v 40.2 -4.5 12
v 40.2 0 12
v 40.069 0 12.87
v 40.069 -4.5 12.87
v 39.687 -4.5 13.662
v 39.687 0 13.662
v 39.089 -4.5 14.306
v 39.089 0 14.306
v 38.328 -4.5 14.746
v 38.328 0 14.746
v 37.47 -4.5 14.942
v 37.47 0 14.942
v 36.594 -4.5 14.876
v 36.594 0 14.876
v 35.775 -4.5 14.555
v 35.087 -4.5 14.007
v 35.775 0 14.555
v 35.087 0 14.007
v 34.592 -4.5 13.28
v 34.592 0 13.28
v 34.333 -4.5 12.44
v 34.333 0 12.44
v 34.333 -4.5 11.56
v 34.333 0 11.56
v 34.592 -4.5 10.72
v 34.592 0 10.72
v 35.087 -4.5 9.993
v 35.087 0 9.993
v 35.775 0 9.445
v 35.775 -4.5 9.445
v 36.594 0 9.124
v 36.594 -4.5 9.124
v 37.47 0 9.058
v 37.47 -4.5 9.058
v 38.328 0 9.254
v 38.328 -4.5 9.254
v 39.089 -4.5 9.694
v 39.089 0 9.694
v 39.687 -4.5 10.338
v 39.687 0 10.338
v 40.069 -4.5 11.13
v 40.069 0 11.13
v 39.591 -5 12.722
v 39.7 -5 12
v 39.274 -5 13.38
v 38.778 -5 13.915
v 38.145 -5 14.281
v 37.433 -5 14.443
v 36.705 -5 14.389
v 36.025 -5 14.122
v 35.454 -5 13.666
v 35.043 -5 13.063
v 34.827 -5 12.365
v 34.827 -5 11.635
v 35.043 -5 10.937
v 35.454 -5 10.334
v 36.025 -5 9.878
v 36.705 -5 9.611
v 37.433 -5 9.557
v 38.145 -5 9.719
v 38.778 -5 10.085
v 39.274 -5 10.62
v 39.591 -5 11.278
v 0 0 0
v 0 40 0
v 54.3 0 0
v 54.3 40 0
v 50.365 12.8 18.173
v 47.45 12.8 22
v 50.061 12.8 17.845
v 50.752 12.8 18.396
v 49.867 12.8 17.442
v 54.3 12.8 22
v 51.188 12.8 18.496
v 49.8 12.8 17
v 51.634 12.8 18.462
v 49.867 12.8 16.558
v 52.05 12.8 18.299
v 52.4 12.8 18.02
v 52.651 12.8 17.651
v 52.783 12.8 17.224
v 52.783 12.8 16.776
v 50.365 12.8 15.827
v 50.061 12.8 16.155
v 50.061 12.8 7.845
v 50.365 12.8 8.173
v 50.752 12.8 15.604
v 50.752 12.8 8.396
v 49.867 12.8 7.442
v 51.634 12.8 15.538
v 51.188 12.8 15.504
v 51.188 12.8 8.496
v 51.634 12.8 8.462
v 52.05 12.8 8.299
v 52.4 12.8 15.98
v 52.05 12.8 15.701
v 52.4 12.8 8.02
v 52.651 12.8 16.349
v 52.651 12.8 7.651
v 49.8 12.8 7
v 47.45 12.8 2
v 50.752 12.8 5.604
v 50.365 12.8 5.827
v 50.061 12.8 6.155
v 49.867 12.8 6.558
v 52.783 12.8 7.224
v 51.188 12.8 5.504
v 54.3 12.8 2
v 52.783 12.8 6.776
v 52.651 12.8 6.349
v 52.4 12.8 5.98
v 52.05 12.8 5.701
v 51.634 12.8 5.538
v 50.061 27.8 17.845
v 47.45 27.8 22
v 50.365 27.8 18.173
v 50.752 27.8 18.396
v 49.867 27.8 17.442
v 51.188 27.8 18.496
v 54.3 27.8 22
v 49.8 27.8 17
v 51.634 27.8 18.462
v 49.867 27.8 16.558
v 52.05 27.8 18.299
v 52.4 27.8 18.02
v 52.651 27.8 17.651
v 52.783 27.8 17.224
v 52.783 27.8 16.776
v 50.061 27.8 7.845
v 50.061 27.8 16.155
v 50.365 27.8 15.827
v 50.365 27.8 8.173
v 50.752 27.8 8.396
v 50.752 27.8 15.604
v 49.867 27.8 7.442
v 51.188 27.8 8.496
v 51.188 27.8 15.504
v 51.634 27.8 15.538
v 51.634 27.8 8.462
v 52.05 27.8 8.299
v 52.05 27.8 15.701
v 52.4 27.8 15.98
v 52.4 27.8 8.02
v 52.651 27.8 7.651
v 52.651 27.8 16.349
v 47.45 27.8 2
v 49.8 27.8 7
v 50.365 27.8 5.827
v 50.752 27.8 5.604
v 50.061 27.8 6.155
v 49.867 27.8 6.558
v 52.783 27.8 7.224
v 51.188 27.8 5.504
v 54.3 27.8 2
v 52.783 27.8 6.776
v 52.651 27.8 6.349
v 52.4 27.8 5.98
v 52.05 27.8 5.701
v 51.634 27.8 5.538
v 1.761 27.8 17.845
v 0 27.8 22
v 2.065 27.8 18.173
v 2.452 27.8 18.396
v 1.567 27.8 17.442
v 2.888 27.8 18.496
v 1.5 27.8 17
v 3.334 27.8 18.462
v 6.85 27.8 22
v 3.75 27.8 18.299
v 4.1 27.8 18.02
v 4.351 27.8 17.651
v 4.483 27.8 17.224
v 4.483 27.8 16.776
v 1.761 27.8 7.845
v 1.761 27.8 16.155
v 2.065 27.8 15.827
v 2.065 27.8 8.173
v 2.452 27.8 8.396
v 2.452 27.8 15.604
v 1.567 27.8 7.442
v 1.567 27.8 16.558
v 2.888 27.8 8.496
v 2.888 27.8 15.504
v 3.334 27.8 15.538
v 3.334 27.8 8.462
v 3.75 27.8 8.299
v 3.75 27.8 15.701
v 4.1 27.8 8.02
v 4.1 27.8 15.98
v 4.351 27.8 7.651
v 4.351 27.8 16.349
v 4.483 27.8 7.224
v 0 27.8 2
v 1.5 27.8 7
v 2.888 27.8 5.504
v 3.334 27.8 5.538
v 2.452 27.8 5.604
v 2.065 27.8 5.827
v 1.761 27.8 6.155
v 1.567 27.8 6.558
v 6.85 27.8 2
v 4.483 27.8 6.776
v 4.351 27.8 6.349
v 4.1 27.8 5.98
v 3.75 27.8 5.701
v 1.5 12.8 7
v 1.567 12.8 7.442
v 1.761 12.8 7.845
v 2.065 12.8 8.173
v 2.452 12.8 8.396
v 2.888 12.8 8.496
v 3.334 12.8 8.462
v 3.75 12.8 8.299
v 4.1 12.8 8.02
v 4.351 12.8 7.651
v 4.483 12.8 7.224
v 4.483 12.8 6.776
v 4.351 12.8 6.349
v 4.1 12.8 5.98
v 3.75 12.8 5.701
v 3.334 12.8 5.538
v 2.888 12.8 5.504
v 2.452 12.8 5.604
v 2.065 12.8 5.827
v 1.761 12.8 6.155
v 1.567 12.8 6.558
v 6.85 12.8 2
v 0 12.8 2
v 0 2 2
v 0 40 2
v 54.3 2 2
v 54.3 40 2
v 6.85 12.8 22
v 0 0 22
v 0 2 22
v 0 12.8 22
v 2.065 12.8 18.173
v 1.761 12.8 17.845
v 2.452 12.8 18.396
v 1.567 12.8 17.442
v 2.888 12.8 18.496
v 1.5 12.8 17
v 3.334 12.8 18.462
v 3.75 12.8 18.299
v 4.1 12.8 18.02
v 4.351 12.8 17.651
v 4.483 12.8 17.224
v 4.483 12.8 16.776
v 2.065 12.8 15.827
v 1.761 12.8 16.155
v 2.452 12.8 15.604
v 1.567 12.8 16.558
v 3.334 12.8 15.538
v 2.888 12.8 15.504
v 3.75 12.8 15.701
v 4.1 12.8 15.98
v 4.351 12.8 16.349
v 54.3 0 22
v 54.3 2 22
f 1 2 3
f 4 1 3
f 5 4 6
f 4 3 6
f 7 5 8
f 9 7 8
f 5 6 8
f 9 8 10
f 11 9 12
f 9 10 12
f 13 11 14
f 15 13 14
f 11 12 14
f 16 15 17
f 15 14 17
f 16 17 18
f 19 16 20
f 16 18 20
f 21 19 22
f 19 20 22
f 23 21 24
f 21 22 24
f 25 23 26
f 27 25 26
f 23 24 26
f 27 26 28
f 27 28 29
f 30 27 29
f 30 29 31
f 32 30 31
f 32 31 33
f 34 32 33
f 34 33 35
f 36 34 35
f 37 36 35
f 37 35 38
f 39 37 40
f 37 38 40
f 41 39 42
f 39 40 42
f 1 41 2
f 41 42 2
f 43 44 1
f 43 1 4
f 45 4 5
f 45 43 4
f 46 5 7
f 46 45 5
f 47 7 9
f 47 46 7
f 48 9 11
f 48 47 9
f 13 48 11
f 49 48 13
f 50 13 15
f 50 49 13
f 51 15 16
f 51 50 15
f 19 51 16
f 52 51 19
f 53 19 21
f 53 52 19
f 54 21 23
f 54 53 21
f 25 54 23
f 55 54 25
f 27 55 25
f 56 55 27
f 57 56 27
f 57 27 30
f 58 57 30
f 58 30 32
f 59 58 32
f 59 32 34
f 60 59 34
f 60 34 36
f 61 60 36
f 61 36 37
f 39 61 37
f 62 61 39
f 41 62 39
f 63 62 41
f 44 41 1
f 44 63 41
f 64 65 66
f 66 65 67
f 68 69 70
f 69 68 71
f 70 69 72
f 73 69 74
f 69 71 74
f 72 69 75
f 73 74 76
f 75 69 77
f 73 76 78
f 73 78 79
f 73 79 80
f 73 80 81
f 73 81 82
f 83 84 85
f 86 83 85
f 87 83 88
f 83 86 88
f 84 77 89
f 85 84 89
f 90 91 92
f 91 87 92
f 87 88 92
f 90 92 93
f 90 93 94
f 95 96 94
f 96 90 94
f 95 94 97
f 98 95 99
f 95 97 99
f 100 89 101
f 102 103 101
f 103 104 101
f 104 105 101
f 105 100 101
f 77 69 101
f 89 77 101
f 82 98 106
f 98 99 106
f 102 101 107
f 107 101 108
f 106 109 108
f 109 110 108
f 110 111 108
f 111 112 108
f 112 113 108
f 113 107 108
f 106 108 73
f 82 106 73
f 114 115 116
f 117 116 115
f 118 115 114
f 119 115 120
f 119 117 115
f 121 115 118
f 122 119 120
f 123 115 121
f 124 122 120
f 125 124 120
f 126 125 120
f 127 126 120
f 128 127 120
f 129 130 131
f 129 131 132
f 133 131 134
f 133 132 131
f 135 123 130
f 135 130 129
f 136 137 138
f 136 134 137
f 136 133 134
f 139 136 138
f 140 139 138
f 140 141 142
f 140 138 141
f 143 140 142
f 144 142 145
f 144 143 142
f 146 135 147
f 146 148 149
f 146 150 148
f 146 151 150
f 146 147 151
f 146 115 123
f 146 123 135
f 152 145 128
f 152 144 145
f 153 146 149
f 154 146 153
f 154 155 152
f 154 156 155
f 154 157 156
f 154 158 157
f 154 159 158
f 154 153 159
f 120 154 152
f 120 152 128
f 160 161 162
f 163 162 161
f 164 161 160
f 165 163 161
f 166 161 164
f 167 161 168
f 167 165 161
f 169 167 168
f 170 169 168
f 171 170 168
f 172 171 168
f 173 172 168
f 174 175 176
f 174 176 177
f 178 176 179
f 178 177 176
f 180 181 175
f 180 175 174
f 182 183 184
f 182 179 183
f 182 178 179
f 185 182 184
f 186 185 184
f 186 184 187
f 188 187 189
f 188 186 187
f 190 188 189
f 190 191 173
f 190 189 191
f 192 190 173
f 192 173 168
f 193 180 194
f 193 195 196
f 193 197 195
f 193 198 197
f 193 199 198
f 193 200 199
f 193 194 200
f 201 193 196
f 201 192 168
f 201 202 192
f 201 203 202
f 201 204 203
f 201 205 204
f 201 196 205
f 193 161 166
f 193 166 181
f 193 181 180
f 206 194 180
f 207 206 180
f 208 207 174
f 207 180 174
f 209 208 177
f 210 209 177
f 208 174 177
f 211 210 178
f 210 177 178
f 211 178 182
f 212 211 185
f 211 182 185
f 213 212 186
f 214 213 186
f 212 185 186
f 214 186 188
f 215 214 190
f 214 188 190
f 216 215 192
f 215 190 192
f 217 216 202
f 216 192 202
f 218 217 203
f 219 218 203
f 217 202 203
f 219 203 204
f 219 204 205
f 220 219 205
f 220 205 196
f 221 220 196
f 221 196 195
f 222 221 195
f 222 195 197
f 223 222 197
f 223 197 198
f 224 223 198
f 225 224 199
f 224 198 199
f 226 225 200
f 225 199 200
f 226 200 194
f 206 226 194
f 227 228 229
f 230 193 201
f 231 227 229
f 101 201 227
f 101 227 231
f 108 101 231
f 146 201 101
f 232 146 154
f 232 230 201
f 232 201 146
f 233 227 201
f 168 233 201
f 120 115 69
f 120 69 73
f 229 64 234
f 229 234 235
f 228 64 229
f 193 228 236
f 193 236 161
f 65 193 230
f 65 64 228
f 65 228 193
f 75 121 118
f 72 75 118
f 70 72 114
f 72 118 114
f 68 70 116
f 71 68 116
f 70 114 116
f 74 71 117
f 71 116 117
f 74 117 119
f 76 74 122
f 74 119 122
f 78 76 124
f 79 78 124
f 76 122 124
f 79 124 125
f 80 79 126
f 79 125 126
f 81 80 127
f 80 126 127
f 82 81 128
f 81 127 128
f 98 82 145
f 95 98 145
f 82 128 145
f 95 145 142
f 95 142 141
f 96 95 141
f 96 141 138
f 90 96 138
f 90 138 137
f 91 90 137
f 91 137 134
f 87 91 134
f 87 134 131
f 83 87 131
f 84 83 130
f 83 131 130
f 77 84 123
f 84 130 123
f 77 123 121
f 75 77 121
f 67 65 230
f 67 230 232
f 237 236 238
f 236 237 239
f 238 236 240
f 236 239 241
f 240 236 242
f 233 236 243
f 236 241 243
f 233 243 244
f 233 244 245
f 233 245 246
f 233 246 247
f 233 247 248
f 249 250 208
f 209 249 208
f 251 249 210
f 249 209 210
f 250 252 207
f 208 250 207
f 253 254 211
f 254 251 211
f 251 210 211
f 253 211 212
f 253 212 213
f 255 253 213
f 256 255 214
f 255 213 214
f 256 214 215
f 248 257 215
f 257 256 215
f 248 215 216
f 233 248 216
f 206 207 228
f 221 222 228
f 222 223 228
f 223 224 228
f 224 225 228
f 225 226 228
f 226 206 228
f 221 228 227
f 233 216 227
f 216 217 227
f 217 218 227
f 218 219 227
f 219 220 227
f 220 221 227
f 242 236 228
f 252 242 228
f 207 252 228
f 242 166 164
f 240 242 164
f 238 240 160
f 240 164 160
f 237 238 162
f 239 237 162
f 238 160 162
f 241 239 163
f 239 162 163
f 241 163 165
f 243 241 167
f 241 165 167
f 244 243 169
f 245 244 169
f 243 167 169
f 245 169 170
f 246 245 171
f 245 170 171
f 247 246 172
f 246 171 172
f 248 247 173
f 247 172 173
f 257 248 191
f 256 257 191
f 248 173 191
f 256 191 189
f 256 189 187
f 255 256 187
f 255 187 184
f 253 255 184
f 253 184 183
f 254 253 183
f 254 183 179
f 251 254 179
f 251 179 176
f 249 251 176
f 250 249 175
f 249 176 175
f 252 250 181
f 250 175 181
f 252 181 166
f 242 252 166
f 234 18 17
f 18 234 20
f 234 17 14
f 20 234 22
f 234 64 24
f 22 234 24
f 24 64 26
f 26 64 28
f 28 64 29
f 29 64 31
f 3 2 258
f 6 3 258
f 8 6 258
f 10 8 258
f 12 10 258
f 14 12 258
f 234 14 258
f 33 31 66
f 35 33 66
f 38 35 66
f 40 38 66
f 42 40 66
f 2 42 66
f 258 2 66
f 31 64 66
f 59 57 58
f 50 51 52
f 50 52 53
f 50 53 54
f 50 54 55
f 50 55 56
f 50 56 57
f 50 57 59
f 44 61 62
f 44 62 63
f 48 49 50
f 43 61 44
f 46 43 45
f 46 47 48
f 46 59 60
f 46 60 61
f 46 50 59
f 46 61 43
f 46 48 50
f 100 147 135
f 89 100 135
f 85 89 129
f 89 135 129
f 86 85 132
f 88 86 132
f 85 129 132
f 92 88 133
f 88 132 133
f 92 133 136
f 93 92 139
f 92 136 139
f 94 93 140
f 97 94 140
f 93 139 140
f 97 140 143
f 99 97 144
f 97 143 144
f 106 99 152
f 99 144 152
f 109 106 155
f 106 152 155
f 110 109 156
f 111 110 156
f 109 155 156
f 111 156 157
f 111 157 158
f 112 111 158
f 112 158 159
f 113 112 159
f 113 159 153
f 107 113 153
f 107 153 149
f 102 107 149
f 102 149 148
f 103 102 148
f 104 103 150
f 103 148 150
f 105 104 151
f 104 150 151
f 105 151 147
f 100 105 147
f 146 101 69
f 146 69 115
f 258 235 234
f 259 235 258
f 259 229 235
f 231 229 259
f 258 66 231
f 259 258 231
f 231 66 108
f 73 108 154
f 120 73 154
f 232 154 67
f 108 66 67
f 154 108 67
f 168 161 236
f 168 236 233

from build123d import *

# Parameters (mm, degrees)
SKETCH_W        = 54.3
SKETCH_H        = 38
PAD_DEPTH       = 2
SKETCH001_W     = 54.3
SKETCH001_H     = 2
PAD001_DEPTH    = 22
SKETCH002_R     = 2.95
PAD002_DEPTH    = 5
SKETCH003_W     = 6.85
SKETCH003_H     = 15
PAD003_DEPTH    = 22
SKETCH004_R     = 1.5
POCKET_DEPTH    = 15
SKETCH005_W     = 6.85
SKETCH005_H     = 15
PAD004_DEPTH    = 22
SKETCH006_R     = 1.5
POCKET001_DEPTH = 15
CHAMFER_SIZE    = 0.5


with BuildPart() as part:
    # Sketch → Pad (new body)
    with BuildSketch(Plane.XY):
        with Locations((27.15, 21)):
            Rectangle(SKETCH_W, SKETCH_H)
    extrude(amount=PAD_DEPTH)

    # Sketch001 → Pad001 (join)
    with BuildSketch(Plane.XY):
        with Locations((27.15, 1)):
            Rectangle(SKETCH001_W, SKETCH001_H)
    extrude(amount=PAD001_DEPTH)

    # Sketch002 → Pad002 (join)
    with BuildSketch(Plane.XZ):
        with Locations((37.25, 12)):
            Circle(SKETCH002_R)
    extrude(amount=PAD002_DEPTH)

    # Sketch003 → Pad003 (join)
    with BuildSketch(Plane.XY):
        with Locations((3.425, 20.3)):
            Rectangle(SKETCH003_W, SKETCH003_H)
    extrude(amount=PAD003_DEPTH)

    # Sketch004 (on Face14 of Pad003) → Pocket (cut)
    with BuildSketch(Plane(origin=(0, 27.8, 0), x_dir=(-1, 0, 0), z_dir=(0, 1, 0))):
        with Locations((-3, 17)):
            Circle(SKETCH004_R)
        with Locations((-3, 7)):
            Circle(SKETCH004_R)
    extrude(amount=-POCKET_DEPTH, mode=Mode.SUBTRACT)

    # Sketch005 → Pad004 (join)
    with BuildSketch(Plane.XY):
        with Locations((50.875, 20.3)):
            Rectangle(SKETCH005_W, SKETCH005_H)
    extrude(amount=PAD004_DEPTH)

    # Sketch006 (on Face13 of Pad004) → Pocket001 (cut)
    with BuildSketch(Plane(origin=(0, 27.8, 0), x_dir=(-1, 0, 0), z_dir=(0, 1, 0))):
        with Locations((-51.3, 17)):
            Circle(SKETCH006_R)
        with Locations((-51.3, 7)):
            Circle(SKETCH006_R)
    extrude(amount=-POCKET001_DEPTH, mode=Mode.SUBTRACT)

    # Chamfer
    chamfer_edges = [part.edges().sort_by_distance(p)[0] for p in [
        (34.3, -5, 12),
    ]]
    chamfer(chamfer_edges, length=CHAMFER_SIZE)


solid = part.part
